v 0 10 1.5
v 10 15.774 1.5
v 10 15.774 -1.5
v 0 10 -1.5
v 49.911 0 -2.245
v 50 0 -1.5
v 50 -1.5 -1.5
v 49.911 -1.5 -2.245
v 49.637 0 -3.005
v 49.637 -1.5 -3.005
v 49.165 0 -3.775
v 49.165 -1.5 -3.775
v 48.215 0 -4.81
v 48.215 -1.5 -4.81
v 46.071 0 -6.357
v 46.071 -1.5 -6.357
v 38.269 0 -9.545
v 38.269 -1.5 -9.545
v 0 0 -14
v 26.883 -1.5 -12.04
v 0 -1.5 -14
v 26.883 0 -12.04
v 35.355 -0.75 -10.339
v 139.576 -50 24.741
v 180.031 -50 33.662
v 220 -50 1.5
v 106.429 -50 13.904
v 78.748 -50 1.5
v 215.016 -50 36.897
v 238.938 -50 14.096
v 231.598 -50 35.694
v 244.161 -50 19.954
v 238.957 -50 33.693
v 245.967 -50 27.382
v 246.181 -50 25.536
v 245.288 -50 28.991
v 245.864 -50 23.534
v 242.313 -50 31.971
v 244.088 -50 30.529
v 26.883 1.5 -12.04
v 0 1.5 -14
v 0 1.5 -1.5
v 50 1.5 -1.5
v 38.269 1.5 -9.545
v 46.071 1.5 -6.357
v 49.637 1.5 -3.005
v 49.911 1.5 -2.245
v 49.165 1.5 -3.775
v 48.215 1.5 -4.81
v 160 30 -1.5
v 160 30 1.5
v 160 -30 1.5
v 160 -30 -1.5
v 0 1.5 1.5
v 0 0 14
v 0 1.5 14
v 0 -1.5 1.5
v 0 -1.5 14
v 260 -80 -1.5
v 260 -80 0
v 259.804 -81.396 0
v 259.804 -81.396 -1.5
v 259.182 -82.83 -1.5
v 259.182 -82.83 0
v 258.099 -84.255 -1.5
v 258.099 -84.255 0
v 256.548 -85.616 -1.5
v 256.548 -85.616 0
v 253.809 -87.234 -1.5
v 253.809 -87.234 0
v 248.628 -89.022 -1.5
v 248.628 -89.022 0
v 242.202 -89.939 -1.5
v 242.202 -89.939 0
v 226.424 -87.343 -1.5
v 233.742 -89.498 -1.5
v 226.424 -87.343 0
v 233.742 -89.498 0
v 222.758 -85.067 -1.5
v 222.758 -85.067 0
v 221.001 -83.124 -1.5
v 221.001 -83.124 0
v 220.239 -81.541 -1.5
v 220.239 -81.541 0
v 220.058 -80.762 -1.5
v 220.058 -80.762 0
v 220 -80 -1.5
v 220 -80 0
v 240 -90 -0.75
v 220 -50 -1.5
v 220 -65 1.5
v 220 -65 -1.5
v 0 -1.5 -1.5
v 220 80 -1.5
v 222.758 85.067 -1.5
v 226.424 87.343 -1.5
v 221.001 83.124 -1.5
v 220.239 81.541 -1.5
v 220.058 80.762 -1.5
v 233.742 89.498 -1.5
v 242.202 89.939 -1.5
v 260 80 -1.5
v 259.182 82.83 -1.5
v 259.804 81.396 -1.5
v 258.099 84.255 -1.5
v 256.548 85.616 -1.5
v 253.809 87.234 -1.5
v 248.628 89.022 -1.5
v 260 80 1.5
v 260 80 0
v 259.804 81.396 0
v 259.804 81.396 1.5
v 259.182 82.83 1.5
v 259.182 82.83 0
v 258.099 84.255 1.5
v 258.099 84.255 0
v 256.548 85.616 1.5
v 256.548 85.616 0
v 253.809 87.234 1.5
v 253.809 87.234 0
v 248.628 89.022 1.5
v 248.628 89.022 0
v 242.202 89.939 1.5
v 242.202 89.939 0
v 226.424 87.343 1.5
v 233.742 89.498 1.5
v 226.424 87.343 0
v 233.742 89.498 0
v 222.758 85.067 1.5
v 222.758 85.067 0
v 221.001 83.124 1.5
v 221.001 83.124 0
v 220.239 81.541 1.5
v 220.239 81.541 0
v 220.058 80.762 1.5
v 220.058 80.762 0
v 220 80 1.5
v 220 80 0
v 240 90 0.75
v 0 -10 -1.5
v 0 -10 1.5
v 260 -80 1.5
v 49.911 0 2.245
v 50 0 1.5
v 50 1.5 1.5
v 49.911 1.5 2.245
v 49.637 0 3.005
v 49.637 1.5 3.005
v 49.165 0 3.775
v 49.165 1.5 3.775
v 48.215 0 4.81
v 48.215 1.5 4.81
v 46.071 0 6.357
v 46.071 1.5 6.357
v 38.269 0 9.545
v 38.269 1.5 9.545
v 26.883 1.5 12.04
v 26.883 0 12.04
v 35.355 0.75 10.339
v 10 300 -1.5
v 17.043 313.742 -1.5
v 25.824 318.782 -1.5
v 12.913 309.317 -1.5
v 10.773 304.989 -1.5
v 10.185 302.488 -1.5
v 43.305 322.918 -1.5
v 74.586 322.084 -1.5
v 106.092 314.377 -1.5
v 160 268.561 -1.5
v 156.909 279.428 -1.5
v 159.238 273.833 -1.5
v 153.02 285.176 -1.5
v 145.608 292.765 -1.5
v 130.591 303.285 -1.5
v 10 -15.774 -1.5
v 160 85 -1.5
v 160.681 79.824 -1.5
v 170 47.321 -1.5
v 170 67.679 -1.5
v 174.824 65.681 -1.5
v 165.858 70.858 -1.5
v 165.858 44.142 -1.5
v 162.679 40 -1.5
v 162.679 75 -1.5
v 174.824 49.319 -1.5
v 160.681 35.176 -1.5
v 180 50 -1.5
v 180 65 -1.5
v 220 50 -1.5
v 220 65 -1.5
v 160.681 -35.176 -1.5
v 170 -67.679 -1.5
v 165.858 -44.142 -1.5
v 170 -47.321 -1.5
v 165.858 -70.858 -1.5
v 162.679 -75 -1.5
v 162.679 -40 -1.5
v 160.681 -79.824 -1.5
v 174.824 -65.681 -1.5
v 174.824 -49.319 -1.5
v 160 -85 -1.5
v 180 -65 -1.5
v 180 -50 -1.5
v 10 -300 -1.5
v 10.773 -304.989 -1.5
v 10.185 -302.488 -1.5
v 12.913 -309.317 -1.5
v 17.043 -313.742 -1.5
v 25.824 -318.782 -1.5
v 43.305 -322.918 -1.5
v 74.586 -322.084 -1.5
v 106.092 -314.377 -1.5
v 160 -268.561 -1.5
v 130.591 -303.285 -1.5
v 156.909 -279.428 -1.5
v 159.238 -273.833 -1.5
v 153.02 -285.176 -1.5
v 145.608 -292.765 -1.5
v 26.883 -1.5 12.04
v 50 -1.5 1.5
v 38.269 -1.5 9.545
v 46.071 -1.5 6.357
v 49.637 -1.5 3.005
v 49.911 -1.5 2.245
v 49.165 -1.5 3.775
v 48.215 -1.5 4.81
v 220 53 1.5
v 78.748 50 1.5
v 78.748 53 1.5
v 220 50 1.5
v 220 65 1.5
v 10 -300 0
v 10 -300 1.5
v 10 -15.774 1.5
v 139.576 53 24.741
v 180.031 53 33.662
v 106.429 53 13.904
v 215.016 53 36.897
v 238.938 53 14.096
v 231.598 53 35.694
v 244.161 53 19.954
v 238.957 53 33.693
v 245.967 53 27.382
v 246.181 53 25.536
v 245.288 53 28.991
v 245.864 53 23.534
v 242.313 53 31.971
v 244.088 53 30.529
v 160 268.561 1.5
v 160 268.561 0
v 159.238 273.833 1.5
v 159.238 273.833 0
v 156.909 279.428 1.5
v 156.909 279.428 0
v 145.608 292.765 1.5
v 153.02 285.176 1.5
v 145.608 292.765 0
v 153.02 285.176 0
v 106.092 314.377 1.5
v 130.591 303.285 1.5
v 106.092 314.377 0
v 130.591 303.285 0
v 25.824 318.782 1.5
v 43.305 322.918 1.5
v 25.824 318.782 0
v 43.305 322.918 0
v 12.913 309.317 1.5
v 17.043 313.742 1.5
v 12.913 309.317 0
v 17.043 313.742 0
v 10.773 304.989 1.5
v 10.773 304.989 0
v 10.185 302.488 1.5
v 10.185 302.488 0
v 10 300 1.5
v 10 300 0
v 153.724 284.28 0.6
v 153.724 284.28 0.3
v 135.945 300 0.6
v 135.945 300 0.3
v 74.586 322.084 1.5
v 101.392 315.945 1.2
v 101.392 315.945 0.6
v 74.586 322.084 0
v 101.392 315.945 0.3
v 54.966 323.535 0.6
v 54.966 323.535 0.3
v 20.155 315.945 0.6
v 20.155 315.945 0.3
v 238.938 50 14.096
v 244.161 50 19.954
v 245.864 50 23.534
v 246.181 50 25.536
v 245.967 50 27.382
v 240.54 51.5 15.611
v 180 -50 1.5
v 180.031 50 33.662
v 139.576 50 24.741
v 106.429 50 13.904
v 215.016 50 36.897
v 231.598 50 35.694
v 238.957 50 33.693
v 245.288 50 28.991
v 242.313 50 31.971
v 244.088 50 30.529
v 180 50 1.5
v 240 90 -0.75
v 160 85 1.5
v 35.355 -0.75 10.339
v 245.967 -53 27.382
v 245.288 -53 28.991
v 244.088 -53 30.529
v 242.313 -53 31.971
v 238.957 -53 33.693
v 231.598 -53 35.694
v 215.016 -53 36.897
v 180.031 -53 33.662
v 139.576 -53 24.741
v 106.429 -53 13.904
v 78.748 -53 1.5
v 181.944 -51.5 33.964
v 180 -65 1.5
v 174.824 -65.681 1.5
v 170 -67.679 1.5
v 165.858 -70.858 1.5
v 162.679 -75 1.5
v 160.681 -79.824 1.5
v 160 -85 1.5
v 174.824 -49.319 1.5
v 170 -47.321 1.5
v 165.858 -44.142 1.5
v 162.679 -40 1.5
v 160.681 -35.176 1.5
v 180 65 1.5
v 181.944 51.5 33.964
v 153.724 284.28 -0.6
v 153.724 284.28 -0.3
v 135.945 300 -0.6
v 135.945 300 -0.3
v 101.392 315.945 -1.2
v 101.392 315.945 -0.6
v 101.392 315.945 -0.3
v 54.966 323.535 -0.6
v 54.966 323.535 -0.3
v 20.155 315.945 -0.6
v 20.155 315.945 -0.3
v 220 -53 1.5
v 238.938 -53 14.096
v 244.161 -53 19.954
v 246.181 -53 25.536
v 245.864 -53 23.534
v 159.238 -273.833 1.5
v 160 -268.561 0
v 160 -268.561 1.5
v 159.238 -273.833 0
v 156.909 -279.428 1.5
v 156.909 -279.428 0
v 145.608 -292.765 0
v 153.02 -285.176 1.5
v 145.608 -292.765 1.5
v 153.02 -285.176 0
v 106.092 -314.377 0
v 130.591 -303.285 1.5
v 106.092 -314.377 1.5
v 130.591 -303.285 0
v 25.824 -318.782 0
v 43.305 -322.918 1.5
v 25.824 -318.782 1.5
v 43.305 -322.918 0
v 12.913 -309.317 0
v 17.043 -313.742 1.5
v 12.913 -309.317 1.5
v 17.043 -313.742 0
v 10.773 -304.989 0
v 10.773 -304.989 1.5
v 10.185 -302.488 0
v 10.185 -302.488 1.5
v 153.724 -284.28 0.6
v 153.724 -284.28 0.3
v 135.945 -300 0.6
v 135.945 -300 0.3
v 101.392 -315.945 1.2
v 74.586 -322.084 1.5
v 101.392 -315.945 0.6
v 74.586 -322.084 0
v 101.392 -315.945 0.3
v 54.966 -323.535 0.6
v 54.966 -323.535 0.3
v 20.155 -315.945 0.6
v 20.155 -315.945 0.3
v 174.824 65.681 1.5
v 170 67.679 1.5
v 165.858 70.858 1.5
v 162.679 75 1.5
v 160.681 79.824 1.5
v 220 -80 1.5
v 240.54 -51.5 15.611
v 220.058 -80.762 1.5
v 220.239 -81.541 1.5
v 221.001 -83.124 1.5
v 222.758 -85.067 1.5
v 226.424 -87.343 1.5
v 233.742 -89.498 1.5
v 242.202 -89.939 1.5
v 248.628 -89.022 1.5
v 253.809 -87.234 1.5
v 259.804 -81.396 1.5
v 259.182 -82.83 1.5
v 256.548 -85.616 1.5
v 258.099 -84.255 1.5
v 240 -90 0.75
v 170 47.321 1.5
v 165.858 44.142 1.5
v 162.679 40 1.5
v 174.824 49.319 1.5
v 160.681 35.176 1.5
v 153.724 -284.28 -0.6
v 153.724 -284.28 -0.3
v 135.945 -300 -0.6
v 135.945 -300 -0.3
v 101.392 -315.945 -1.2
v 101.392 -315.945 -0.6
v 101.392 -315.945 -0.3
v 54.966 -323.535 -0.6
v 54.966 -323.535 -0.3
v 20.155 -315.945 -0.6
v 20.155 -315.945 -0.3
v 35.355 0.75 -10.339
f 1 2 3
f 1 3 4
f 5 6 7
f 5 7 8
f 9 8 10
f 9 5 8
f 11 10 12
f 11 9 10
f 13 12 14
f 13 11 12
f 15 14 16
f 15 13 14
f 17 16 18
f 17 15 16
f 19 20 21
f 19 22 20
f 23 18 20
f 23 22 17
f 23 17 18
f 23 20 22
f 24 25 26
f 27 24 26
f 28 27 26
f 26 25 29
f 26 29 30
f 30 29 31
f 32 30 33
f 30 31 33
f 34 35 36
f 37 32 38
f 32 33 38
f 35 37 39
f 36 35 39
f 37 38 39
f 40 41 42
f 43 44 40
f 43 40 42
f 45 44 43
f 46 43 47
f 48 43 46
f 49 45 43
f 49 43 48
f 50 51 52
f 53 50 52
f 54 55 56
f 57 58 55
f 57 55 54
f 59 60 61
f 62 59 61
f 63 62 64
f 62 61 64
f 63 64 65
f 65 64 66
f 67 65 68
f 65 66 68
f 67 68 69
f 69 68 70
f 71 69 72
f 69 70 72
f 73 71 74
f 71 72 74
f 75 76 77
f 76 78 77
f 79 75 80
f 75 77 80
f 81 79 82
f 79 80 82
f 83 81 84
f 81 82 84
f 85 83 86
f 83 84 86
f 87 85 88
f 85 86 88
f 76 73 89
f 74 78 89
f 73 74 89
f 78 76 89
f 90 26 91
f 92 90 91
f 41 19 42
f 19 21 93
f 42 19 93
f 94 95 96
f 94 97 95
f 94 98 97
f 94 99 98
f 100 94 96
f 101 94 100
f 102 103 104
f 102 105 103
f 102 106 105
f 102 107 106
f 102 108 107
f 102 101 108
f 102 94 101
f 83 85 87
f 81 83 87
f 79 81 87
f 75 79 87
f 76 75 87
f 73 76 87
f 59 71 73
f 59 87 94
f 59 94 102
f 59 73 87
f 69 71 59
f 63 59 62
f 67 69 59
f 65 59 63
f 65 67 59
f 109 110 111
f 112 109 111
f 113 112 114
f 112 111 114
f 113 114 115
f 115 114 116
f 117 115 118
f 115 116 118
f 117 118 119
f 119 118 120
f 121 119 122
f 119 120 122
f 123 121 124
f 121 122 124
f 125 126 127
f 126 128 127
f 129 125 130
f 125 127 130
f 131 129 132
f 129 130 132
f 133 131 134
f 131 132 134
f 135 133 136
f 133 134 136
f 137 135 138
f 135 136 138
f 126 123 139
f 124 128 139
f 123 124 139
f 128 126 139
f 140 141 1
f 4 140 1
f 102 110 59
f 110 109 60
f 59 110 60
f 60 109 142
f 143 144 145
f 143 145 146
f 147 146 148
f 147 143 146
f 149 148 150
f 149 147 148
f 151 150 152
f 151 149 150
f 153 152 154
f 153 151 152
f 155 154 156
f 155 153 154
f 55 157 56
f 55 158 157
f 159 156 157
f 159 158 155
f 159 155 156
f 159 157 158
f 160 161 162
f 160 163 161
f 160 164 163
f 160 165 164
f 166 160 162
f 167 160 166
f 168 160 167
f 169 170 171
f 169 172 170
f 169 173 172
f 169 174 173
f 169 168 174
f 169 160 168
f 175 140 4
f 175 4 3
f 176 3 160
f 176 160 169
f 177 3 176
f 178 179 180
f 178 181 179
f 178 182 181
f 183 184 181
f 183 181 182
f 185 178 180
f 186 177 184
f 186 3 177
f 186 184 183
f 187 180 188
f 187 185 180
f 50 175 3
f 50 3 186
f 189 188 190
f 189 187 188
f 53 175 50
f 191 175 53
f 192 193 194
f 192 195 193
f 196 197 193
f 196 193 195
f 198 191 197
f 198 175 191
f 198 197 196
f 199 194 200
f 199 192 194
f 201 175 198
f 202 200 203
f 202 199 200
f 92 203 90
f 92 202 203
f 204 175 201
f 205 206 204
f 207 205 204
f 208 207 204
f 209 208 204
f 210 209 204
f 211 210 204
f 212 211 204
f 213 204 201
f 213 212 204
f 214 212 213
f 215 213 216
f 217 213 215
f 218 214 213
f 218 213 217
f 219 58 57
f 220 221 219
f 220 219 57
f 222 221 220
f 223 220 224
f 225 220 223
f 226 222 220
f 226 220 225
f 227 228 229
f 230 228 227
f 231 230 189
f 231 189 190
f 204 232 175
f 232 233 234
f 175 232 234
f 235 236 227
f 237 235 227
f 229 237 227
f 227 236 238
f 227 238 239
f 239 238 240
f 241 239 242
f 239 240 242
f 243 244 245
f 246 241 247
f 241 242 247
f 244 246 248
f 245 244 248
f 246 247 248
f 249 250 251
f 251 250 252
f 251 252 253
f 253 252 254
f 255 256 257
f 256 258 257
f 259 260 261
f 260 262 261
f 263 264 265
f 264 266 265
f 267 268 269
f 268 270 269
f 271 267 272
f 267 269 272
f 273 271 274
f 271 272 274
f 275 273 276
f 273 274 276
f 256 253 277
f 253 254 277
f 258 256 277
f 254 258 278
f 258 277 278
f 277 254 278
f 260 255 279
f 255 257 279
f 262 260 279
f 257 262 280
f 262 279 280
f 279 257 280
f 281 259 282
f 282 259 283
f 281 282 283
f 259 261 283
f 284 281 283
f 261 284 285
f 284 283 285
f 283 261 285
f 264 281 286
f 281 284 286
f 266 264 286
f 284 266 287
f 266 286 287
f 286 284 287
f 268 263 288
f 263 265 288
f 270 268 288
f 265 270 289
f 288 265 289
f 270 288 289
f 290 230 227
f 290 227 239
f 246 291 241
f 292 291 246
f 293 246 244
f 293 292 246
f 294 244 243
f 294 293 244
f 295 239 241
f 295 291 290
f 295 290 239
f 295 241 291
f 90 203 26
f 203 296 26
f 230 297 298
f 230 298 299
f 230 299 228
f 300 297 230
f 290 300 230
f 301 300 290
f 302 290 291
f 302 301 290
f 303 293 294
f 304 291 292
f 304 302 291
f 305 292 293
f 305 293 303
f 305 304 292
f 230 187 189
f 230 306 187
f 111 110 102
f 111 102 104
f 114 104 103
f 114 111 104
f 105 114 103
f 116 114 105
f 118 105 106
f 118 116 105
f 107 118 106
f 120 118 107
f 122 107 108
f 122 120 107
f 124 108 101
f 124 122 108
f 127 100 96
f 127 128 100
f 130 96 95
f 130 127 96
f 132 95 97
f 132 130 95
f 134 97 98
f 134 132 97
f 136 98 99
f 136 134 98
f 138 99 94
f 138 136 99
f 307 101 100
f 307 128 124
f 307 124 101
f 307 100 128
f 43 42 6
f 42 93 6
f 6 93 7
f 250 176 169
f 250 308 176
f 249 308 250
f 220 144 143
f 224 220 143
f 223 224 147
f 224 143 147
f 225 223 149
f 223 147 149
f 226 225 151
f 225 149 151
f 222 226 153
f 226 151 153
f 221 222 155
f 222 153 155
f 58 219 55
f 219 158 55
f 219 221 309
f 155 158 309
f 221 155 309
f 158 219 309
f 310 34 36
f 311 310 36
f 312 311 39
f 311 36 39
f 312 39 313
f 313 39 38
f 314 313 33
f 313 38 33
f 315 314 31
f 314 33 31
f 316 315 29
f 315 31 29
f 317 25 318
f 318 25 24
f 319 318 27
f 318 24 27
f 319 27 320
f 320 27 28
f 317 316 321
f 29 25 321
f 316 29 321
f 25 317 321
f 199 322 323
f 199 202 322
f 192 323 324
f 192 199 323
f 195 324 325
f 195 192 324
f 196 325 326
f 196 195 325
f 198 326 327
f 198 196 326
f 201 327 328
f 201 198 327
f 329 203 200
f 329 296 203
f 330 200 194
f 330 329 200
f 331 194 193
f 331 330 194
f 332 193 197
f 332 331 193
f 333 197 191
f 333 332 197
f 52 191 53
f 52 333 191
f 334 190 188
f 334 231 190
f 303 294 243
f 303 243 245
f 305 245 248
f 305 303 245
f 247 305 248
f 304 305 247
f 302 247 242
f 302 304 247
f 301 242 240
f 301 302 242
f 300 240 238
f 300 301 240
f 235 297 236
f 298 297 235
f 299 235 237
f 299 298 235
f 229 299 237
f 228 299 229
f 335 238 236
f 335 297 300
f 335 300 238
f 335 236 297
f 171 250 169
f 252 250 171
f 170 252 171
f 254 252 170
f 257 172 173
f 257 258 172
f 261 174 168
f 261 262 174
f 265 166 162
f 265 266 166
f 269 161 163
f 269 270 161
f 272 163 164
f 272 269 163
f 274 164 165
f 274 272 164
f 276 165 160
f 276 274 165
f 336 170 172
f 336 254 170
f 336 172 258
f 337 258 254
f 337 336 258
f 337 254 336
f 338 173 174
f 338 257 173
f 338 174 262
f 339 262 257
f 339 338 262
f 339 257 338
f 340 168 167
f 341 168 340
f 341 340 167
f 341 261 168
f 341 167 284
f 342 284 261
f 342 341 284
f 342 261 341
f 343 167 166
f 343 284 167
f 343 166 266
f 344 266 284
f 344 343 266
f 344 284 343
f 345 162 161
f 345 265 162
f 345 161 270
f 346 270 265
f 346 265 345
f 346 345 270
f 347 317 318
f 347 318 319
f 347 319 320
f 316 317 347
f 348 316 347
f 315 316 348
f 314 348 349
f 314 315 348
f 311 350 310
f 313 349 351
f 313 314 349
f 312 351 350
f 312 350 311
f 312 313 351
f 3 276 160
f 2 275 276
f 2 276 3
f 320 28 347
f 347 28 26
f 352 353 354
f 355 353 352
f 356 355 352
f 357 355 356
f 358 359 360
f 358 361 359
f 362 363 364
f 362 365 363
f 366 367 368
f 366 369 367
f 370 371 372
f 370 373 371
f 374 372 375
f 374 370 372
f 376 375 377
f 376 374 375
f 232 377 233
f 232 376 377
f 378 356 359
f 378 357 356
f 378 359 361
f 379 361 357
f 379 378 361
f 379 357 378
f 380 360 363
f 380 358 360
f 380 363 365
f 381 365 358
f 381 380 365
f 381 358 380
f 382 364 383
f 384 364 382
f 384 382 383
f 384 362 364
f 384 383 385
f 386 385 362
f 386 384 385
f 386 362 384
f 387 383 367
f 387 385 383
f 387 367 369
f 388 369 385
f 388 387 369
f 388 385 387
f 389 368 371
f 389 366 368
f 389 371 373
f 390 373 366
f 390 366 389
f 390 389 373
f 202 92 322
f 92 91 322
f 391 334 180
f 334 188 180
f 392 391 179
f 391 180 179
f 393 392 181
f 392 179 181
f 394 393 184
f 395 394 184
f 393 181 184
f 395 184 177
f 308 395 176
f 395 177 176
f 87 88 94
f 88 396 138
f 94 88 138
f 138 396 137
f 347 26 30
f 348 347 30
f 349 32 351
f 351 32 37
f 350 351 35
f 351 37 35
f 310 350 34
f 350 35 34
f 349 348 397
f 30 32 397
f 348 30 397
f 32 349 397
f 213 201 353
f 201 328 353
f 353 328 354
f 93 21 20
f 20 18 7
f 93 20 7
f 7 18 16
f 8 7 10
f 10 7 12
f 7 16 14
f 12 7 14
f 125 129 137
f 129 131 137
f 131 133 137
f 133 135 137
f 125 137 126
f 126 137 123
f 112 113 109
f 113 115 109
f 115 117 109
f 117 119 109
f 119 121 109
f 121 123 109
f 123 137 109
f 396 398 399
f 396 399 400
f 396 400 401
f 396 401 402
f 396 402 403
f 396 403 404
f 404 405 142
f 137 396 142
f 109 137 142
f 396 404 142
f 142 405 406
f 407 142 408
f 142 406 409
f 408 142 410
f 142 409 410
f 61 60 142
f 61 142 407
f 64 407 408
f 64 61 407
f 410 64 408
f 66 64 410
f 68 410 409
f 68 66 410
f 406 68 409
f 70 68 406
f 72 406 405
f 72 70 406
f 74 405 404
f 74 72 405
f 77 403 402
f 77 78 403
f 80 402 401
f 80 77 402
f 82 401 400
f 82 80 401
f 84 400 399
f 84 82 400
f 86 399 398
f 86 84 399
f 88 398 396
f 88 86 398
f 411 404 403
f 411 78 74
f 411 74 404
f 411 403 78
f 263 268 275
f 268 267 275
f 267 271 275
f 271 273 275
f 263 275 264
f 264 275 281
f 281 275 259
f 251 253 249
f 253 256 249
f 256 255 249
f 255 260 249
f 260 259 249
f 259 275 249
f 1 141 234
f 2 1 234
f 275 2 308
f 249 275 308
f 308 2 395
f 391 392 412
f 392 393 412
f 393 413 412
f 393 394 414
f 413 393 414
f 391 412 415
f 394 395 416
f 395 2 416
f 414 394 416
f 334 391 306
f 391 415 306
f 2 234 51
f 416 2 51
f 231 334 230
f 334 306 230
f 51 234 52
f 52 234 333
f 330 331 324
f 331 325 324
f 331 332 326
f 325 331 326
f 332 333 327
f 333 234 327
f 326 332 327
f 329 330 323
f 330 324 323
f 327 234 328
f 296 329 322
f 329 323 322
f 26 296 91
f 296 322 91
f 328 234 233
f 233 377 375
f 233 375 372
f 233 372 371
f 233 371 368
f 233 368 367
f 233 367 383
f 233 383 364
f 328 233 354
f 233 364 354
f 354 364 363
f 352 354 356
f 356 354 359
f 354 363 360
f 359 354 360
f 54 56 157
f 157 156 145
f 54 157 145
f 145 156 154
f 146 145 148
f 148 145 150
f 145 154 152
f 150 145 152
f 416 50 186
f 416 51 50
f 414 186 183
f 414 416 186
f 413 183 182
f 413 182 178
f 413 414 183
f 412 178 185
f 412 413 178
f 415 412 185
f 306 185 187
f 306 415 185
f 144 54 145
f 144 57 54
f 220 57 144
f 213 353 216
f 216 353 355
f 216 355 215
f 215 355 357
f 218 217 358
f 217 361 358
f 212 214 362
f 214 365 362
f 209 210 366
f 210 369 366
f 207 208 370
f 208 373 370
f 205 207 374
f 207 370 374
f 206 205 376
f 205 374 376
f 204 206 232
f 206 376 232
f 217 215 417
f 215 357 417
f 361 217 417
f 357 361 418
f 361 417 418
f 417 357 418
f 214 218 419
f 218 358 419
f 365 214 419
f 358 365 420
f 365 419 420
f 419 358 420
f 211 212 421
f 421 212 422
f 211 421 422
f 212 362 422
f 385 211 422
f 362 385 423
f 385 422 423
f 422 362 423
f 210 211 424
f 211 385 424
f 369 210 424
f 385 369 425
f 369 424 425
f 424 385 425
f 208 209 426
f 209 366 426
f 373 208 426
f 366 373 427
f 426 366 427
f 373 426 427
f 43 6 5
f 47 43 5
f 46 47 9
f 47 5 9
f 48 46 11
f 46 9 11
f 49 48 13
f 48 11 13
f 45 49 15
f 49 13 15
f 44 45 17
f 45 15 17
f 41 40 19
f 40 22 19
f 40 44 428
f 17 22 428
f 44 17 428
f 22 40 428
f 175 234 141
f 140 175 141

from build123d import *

# Parameters (mm, degrees)
F1_DEPTH  = 1.5
F4_DEPTH  = 1.5
F7_DEPTH  = 3
F9_R      = 20
F11_DEPTH = 1.5


with BuildPart() as f1:
    # F0 (on Top) → F1 (new body, symmetric)
    with BuildSketch(Plane.XY):
        with BuildLine():
            add(Edge.make_bspline(
                [(135.9451361005, 300), (10, 382.3042689185), (10, 300)],
                knots=[0.9451087561, 0.9451087561, 0.9451087561, 3.2626704882, 3.2626704882, 3.2626704882], degree=2, weights=[1, 0.4004569382, 1]))
            Line((10, 300), (135.9451361005, 300))
        make_face()
        with BuildLine():
            Line((135.9451361005, 300), (10, 300))
            add(Edge.make_bspline(
                [(10, 300), (10, 266.1448048575), (80.4623541034, 249.327885317), (150.9247082069, 232.5109657765), (159.4509271925, 264.3312482271)],
                knots=[3.2626704882, 3.2626704882, 3.2626704882, 4.7729278977, 4.7729278977, 6.2831853072, 6.2831853072, 6.2831853072], degree=2, weights=[1, 0.7281833372, 1, 0.7281833372, 1]))
            add(Edge.make_bspline(
                [(159.4509271925, 264.3312482271), (160, 266.3804158418), (160, 268.5606280881)],
                knots=[0, 0, 0, 0.1210778346, 0.1210778346, 0.1210778346], degree=2, weights=[1, 0.9981680793, 1]))
            add(Edge.make_bspline(
                [(160, 268.5606280881), (160, 284.280314044), (135.9451361005, 300)],
                knots=[0.1210778346, 0.1210778346, 0.1210778346, 0.9451087561, 0.9451087561, 0.9451087561], degree=2, weights=[1, 0.9163155792, 1]))
        make_face()
        with BuildLine():
            Line((0, 10), (0, 0))
            Line((0, 0), (160, 0))
            Line((160, 0), (160, 50))
            Line((160, 50), (220, 50))
            Line((220, 50), (220, 65))
            Line((220, 65), (160, 65))
            Line((160, 65), (160, 268.5606280881))
            add(Edge.make_bspline(
                [(159.4509271925, 264.3312482271), (160, 266.3804158418), (160, 268.5606280881)],
                knots=[0, 0, 0, 0.1210778346, 0.1210778346, 0.1210778346], degree=2, weights=[1, 0.9981680793, 1]))
            add(Edge.make_bspline(
                [(10, 300), (10, 266.1448048575), (80.4623541034, 249.327885317), (150.9247082069, 232.5109657765), (159.4509271925, 264.3312482271)],
                knots=[3.2626704882, 3.2626704882, 3.2626704882, 4.7729278977, 4.7729278977, 6.2831853072, 6.2831853072, 6.2831853072], degree=2, weights=[1, 0.7281833372, 1, 0.7281833372, 1]))
            Line((10, 300), (10, 15.7735026919))
            Line((10, 15.7735026919), (0, 10))
        make_face()
    extrude(amount=F1_DEPTH, both=True)

    # F2: F1 across plane


with BuildPart() as f1_1:
    add(f1.part)
    add(f1.part.mirror(Plane.XZ))

    # F9
    f9_edges = [f1_1.edges().sort_by_distance(p)[0] for p in [
        (160, -65, 0),
        (160, 65, 0),
        (160, -50, 0),
        (160, 50, 0),
    ]]
    fillet(f9_edges, radius=F9_R)


with BuildPart() as f4:
    # F3 (on Front) → F4 (new body, symmetric)
    with BuildSketch(Plane.XZ):
        with BuildLine():
            Line((0, 1.5), (50, 1.5))
            add(Edge.make_bspline(
                [(50, 1.5), (50, 14), (0, 14)],
                knots=[3.1415926536, 3.1415926536, 3.1415926536, 4.7123889804, 4.7123889804, 4.7123889804], degree=2, weights=[1, 0.7071067812, 1]))
            Line((0, 14), (0, 1.5))
        make_face()
    extrude(amount=F4_DEPTH, both=True)


with BuildPart() as f5_1:
    # F5: instance of F4
    add(f4.part.mirror(Plane.XY))


with BuildPart() as f7:
    # F6 (on face) → F7 (new body)
    with BuildSketch(Plane.XZ.offset(-50)):
        with BuildLine():
            add(Edge.make_bspline(
                [(220, 1.5), (248.7791912286, 16.8858120428), (245.9667717283, 27.3819045103)],
                knots=[5.4631466565, 5.4631466565, 5.4631466565, 6.2831853072, 6.2831853072, 6.2831853072], degree=2, weights=[1, 0.9171131194, 1]))
            add(Edge.make_bspline(
                [(245.9667717283, 27.3819045103), (231.0802793994, 82.9390502283), (78.7483781988, 1.5)],
                knots=[0, 0, 0, 2.3215540029, 2.3215540029, 2.3215540029], degree=2, weights=[1, 0.3986270516, 1]))
            Line((78.7483781988, 1.5), (160, 1.5))
            Line((160, 1.5), (220, 1.5))
        make_face()
    extrude(amount=-F7_DEPTH)


with BuildPart() as f8_1:
    # F8: instance of F7
    add(f7.part.mirror(Plane.XZ))


with BuildPart() as f11:
    # F10 (on Top) → F11 (new body, symmetric)
    with BuildSketch(Plane.XY):
        with BuildLine():
            add(Edge.make_bspline(
                [(260, 80), (260, 90), (240, 90), (220, 90), (220, 80)],
                knots=[3.1415926536, 3.1415926536, 3.1415926536, 4.7123889804, 4.7123889804, 6.2831853072, 6.2831853072, 6.2831853072], degree=2, weights=[1, 0.7071067812, 1, 0.7071067812, 1]))
            Line((220, 80), (260, 80))
        make_face()
        with BuildLine():
            add(Edge.make_bspline(
                [(220, 80), (220, 70), (240, 70), (260, 70), (260, 80)],
                knots=[0, 0, 0, 1.5707963268, 1.5707963268, 3.1415926536, 3.1415926536, 3.1415926536], degree=2, weights=[1, 0.7071067812, 1, 0.7071067812, 1]))
            Line((220, 80), (220, 0))
            Line((220, 0), (260, 0))
            Line((260, 0), (260, 80))
        make_face()
        with BuildLine():
            Line((260, 80), (220, 80))
            add(Edge.make_bspline(
                [(220, 80), (220, 70), (240, 70), (260, 70), (260, 80)],
                knots=[0, 0, 0, 1.5707963268, 1.5707963268, 3.1415926536, 3.1415926536, 3.1415926536], degree=2, weights=[1, 0.7071067812, 1, 0.7071067812, 1]))
        make_face()
    extrude(amount=F11_DEPTH, both=True)

    # F12: F11 across plane


with BuildPart() as f11_1:
    add(f11.part)
    add(f11.part.mirror(Plane.XZ))


solid = Compound([f1_1.part, f4.part, f5_1.part, f7.part, f8_1.part, f11_1.part])
